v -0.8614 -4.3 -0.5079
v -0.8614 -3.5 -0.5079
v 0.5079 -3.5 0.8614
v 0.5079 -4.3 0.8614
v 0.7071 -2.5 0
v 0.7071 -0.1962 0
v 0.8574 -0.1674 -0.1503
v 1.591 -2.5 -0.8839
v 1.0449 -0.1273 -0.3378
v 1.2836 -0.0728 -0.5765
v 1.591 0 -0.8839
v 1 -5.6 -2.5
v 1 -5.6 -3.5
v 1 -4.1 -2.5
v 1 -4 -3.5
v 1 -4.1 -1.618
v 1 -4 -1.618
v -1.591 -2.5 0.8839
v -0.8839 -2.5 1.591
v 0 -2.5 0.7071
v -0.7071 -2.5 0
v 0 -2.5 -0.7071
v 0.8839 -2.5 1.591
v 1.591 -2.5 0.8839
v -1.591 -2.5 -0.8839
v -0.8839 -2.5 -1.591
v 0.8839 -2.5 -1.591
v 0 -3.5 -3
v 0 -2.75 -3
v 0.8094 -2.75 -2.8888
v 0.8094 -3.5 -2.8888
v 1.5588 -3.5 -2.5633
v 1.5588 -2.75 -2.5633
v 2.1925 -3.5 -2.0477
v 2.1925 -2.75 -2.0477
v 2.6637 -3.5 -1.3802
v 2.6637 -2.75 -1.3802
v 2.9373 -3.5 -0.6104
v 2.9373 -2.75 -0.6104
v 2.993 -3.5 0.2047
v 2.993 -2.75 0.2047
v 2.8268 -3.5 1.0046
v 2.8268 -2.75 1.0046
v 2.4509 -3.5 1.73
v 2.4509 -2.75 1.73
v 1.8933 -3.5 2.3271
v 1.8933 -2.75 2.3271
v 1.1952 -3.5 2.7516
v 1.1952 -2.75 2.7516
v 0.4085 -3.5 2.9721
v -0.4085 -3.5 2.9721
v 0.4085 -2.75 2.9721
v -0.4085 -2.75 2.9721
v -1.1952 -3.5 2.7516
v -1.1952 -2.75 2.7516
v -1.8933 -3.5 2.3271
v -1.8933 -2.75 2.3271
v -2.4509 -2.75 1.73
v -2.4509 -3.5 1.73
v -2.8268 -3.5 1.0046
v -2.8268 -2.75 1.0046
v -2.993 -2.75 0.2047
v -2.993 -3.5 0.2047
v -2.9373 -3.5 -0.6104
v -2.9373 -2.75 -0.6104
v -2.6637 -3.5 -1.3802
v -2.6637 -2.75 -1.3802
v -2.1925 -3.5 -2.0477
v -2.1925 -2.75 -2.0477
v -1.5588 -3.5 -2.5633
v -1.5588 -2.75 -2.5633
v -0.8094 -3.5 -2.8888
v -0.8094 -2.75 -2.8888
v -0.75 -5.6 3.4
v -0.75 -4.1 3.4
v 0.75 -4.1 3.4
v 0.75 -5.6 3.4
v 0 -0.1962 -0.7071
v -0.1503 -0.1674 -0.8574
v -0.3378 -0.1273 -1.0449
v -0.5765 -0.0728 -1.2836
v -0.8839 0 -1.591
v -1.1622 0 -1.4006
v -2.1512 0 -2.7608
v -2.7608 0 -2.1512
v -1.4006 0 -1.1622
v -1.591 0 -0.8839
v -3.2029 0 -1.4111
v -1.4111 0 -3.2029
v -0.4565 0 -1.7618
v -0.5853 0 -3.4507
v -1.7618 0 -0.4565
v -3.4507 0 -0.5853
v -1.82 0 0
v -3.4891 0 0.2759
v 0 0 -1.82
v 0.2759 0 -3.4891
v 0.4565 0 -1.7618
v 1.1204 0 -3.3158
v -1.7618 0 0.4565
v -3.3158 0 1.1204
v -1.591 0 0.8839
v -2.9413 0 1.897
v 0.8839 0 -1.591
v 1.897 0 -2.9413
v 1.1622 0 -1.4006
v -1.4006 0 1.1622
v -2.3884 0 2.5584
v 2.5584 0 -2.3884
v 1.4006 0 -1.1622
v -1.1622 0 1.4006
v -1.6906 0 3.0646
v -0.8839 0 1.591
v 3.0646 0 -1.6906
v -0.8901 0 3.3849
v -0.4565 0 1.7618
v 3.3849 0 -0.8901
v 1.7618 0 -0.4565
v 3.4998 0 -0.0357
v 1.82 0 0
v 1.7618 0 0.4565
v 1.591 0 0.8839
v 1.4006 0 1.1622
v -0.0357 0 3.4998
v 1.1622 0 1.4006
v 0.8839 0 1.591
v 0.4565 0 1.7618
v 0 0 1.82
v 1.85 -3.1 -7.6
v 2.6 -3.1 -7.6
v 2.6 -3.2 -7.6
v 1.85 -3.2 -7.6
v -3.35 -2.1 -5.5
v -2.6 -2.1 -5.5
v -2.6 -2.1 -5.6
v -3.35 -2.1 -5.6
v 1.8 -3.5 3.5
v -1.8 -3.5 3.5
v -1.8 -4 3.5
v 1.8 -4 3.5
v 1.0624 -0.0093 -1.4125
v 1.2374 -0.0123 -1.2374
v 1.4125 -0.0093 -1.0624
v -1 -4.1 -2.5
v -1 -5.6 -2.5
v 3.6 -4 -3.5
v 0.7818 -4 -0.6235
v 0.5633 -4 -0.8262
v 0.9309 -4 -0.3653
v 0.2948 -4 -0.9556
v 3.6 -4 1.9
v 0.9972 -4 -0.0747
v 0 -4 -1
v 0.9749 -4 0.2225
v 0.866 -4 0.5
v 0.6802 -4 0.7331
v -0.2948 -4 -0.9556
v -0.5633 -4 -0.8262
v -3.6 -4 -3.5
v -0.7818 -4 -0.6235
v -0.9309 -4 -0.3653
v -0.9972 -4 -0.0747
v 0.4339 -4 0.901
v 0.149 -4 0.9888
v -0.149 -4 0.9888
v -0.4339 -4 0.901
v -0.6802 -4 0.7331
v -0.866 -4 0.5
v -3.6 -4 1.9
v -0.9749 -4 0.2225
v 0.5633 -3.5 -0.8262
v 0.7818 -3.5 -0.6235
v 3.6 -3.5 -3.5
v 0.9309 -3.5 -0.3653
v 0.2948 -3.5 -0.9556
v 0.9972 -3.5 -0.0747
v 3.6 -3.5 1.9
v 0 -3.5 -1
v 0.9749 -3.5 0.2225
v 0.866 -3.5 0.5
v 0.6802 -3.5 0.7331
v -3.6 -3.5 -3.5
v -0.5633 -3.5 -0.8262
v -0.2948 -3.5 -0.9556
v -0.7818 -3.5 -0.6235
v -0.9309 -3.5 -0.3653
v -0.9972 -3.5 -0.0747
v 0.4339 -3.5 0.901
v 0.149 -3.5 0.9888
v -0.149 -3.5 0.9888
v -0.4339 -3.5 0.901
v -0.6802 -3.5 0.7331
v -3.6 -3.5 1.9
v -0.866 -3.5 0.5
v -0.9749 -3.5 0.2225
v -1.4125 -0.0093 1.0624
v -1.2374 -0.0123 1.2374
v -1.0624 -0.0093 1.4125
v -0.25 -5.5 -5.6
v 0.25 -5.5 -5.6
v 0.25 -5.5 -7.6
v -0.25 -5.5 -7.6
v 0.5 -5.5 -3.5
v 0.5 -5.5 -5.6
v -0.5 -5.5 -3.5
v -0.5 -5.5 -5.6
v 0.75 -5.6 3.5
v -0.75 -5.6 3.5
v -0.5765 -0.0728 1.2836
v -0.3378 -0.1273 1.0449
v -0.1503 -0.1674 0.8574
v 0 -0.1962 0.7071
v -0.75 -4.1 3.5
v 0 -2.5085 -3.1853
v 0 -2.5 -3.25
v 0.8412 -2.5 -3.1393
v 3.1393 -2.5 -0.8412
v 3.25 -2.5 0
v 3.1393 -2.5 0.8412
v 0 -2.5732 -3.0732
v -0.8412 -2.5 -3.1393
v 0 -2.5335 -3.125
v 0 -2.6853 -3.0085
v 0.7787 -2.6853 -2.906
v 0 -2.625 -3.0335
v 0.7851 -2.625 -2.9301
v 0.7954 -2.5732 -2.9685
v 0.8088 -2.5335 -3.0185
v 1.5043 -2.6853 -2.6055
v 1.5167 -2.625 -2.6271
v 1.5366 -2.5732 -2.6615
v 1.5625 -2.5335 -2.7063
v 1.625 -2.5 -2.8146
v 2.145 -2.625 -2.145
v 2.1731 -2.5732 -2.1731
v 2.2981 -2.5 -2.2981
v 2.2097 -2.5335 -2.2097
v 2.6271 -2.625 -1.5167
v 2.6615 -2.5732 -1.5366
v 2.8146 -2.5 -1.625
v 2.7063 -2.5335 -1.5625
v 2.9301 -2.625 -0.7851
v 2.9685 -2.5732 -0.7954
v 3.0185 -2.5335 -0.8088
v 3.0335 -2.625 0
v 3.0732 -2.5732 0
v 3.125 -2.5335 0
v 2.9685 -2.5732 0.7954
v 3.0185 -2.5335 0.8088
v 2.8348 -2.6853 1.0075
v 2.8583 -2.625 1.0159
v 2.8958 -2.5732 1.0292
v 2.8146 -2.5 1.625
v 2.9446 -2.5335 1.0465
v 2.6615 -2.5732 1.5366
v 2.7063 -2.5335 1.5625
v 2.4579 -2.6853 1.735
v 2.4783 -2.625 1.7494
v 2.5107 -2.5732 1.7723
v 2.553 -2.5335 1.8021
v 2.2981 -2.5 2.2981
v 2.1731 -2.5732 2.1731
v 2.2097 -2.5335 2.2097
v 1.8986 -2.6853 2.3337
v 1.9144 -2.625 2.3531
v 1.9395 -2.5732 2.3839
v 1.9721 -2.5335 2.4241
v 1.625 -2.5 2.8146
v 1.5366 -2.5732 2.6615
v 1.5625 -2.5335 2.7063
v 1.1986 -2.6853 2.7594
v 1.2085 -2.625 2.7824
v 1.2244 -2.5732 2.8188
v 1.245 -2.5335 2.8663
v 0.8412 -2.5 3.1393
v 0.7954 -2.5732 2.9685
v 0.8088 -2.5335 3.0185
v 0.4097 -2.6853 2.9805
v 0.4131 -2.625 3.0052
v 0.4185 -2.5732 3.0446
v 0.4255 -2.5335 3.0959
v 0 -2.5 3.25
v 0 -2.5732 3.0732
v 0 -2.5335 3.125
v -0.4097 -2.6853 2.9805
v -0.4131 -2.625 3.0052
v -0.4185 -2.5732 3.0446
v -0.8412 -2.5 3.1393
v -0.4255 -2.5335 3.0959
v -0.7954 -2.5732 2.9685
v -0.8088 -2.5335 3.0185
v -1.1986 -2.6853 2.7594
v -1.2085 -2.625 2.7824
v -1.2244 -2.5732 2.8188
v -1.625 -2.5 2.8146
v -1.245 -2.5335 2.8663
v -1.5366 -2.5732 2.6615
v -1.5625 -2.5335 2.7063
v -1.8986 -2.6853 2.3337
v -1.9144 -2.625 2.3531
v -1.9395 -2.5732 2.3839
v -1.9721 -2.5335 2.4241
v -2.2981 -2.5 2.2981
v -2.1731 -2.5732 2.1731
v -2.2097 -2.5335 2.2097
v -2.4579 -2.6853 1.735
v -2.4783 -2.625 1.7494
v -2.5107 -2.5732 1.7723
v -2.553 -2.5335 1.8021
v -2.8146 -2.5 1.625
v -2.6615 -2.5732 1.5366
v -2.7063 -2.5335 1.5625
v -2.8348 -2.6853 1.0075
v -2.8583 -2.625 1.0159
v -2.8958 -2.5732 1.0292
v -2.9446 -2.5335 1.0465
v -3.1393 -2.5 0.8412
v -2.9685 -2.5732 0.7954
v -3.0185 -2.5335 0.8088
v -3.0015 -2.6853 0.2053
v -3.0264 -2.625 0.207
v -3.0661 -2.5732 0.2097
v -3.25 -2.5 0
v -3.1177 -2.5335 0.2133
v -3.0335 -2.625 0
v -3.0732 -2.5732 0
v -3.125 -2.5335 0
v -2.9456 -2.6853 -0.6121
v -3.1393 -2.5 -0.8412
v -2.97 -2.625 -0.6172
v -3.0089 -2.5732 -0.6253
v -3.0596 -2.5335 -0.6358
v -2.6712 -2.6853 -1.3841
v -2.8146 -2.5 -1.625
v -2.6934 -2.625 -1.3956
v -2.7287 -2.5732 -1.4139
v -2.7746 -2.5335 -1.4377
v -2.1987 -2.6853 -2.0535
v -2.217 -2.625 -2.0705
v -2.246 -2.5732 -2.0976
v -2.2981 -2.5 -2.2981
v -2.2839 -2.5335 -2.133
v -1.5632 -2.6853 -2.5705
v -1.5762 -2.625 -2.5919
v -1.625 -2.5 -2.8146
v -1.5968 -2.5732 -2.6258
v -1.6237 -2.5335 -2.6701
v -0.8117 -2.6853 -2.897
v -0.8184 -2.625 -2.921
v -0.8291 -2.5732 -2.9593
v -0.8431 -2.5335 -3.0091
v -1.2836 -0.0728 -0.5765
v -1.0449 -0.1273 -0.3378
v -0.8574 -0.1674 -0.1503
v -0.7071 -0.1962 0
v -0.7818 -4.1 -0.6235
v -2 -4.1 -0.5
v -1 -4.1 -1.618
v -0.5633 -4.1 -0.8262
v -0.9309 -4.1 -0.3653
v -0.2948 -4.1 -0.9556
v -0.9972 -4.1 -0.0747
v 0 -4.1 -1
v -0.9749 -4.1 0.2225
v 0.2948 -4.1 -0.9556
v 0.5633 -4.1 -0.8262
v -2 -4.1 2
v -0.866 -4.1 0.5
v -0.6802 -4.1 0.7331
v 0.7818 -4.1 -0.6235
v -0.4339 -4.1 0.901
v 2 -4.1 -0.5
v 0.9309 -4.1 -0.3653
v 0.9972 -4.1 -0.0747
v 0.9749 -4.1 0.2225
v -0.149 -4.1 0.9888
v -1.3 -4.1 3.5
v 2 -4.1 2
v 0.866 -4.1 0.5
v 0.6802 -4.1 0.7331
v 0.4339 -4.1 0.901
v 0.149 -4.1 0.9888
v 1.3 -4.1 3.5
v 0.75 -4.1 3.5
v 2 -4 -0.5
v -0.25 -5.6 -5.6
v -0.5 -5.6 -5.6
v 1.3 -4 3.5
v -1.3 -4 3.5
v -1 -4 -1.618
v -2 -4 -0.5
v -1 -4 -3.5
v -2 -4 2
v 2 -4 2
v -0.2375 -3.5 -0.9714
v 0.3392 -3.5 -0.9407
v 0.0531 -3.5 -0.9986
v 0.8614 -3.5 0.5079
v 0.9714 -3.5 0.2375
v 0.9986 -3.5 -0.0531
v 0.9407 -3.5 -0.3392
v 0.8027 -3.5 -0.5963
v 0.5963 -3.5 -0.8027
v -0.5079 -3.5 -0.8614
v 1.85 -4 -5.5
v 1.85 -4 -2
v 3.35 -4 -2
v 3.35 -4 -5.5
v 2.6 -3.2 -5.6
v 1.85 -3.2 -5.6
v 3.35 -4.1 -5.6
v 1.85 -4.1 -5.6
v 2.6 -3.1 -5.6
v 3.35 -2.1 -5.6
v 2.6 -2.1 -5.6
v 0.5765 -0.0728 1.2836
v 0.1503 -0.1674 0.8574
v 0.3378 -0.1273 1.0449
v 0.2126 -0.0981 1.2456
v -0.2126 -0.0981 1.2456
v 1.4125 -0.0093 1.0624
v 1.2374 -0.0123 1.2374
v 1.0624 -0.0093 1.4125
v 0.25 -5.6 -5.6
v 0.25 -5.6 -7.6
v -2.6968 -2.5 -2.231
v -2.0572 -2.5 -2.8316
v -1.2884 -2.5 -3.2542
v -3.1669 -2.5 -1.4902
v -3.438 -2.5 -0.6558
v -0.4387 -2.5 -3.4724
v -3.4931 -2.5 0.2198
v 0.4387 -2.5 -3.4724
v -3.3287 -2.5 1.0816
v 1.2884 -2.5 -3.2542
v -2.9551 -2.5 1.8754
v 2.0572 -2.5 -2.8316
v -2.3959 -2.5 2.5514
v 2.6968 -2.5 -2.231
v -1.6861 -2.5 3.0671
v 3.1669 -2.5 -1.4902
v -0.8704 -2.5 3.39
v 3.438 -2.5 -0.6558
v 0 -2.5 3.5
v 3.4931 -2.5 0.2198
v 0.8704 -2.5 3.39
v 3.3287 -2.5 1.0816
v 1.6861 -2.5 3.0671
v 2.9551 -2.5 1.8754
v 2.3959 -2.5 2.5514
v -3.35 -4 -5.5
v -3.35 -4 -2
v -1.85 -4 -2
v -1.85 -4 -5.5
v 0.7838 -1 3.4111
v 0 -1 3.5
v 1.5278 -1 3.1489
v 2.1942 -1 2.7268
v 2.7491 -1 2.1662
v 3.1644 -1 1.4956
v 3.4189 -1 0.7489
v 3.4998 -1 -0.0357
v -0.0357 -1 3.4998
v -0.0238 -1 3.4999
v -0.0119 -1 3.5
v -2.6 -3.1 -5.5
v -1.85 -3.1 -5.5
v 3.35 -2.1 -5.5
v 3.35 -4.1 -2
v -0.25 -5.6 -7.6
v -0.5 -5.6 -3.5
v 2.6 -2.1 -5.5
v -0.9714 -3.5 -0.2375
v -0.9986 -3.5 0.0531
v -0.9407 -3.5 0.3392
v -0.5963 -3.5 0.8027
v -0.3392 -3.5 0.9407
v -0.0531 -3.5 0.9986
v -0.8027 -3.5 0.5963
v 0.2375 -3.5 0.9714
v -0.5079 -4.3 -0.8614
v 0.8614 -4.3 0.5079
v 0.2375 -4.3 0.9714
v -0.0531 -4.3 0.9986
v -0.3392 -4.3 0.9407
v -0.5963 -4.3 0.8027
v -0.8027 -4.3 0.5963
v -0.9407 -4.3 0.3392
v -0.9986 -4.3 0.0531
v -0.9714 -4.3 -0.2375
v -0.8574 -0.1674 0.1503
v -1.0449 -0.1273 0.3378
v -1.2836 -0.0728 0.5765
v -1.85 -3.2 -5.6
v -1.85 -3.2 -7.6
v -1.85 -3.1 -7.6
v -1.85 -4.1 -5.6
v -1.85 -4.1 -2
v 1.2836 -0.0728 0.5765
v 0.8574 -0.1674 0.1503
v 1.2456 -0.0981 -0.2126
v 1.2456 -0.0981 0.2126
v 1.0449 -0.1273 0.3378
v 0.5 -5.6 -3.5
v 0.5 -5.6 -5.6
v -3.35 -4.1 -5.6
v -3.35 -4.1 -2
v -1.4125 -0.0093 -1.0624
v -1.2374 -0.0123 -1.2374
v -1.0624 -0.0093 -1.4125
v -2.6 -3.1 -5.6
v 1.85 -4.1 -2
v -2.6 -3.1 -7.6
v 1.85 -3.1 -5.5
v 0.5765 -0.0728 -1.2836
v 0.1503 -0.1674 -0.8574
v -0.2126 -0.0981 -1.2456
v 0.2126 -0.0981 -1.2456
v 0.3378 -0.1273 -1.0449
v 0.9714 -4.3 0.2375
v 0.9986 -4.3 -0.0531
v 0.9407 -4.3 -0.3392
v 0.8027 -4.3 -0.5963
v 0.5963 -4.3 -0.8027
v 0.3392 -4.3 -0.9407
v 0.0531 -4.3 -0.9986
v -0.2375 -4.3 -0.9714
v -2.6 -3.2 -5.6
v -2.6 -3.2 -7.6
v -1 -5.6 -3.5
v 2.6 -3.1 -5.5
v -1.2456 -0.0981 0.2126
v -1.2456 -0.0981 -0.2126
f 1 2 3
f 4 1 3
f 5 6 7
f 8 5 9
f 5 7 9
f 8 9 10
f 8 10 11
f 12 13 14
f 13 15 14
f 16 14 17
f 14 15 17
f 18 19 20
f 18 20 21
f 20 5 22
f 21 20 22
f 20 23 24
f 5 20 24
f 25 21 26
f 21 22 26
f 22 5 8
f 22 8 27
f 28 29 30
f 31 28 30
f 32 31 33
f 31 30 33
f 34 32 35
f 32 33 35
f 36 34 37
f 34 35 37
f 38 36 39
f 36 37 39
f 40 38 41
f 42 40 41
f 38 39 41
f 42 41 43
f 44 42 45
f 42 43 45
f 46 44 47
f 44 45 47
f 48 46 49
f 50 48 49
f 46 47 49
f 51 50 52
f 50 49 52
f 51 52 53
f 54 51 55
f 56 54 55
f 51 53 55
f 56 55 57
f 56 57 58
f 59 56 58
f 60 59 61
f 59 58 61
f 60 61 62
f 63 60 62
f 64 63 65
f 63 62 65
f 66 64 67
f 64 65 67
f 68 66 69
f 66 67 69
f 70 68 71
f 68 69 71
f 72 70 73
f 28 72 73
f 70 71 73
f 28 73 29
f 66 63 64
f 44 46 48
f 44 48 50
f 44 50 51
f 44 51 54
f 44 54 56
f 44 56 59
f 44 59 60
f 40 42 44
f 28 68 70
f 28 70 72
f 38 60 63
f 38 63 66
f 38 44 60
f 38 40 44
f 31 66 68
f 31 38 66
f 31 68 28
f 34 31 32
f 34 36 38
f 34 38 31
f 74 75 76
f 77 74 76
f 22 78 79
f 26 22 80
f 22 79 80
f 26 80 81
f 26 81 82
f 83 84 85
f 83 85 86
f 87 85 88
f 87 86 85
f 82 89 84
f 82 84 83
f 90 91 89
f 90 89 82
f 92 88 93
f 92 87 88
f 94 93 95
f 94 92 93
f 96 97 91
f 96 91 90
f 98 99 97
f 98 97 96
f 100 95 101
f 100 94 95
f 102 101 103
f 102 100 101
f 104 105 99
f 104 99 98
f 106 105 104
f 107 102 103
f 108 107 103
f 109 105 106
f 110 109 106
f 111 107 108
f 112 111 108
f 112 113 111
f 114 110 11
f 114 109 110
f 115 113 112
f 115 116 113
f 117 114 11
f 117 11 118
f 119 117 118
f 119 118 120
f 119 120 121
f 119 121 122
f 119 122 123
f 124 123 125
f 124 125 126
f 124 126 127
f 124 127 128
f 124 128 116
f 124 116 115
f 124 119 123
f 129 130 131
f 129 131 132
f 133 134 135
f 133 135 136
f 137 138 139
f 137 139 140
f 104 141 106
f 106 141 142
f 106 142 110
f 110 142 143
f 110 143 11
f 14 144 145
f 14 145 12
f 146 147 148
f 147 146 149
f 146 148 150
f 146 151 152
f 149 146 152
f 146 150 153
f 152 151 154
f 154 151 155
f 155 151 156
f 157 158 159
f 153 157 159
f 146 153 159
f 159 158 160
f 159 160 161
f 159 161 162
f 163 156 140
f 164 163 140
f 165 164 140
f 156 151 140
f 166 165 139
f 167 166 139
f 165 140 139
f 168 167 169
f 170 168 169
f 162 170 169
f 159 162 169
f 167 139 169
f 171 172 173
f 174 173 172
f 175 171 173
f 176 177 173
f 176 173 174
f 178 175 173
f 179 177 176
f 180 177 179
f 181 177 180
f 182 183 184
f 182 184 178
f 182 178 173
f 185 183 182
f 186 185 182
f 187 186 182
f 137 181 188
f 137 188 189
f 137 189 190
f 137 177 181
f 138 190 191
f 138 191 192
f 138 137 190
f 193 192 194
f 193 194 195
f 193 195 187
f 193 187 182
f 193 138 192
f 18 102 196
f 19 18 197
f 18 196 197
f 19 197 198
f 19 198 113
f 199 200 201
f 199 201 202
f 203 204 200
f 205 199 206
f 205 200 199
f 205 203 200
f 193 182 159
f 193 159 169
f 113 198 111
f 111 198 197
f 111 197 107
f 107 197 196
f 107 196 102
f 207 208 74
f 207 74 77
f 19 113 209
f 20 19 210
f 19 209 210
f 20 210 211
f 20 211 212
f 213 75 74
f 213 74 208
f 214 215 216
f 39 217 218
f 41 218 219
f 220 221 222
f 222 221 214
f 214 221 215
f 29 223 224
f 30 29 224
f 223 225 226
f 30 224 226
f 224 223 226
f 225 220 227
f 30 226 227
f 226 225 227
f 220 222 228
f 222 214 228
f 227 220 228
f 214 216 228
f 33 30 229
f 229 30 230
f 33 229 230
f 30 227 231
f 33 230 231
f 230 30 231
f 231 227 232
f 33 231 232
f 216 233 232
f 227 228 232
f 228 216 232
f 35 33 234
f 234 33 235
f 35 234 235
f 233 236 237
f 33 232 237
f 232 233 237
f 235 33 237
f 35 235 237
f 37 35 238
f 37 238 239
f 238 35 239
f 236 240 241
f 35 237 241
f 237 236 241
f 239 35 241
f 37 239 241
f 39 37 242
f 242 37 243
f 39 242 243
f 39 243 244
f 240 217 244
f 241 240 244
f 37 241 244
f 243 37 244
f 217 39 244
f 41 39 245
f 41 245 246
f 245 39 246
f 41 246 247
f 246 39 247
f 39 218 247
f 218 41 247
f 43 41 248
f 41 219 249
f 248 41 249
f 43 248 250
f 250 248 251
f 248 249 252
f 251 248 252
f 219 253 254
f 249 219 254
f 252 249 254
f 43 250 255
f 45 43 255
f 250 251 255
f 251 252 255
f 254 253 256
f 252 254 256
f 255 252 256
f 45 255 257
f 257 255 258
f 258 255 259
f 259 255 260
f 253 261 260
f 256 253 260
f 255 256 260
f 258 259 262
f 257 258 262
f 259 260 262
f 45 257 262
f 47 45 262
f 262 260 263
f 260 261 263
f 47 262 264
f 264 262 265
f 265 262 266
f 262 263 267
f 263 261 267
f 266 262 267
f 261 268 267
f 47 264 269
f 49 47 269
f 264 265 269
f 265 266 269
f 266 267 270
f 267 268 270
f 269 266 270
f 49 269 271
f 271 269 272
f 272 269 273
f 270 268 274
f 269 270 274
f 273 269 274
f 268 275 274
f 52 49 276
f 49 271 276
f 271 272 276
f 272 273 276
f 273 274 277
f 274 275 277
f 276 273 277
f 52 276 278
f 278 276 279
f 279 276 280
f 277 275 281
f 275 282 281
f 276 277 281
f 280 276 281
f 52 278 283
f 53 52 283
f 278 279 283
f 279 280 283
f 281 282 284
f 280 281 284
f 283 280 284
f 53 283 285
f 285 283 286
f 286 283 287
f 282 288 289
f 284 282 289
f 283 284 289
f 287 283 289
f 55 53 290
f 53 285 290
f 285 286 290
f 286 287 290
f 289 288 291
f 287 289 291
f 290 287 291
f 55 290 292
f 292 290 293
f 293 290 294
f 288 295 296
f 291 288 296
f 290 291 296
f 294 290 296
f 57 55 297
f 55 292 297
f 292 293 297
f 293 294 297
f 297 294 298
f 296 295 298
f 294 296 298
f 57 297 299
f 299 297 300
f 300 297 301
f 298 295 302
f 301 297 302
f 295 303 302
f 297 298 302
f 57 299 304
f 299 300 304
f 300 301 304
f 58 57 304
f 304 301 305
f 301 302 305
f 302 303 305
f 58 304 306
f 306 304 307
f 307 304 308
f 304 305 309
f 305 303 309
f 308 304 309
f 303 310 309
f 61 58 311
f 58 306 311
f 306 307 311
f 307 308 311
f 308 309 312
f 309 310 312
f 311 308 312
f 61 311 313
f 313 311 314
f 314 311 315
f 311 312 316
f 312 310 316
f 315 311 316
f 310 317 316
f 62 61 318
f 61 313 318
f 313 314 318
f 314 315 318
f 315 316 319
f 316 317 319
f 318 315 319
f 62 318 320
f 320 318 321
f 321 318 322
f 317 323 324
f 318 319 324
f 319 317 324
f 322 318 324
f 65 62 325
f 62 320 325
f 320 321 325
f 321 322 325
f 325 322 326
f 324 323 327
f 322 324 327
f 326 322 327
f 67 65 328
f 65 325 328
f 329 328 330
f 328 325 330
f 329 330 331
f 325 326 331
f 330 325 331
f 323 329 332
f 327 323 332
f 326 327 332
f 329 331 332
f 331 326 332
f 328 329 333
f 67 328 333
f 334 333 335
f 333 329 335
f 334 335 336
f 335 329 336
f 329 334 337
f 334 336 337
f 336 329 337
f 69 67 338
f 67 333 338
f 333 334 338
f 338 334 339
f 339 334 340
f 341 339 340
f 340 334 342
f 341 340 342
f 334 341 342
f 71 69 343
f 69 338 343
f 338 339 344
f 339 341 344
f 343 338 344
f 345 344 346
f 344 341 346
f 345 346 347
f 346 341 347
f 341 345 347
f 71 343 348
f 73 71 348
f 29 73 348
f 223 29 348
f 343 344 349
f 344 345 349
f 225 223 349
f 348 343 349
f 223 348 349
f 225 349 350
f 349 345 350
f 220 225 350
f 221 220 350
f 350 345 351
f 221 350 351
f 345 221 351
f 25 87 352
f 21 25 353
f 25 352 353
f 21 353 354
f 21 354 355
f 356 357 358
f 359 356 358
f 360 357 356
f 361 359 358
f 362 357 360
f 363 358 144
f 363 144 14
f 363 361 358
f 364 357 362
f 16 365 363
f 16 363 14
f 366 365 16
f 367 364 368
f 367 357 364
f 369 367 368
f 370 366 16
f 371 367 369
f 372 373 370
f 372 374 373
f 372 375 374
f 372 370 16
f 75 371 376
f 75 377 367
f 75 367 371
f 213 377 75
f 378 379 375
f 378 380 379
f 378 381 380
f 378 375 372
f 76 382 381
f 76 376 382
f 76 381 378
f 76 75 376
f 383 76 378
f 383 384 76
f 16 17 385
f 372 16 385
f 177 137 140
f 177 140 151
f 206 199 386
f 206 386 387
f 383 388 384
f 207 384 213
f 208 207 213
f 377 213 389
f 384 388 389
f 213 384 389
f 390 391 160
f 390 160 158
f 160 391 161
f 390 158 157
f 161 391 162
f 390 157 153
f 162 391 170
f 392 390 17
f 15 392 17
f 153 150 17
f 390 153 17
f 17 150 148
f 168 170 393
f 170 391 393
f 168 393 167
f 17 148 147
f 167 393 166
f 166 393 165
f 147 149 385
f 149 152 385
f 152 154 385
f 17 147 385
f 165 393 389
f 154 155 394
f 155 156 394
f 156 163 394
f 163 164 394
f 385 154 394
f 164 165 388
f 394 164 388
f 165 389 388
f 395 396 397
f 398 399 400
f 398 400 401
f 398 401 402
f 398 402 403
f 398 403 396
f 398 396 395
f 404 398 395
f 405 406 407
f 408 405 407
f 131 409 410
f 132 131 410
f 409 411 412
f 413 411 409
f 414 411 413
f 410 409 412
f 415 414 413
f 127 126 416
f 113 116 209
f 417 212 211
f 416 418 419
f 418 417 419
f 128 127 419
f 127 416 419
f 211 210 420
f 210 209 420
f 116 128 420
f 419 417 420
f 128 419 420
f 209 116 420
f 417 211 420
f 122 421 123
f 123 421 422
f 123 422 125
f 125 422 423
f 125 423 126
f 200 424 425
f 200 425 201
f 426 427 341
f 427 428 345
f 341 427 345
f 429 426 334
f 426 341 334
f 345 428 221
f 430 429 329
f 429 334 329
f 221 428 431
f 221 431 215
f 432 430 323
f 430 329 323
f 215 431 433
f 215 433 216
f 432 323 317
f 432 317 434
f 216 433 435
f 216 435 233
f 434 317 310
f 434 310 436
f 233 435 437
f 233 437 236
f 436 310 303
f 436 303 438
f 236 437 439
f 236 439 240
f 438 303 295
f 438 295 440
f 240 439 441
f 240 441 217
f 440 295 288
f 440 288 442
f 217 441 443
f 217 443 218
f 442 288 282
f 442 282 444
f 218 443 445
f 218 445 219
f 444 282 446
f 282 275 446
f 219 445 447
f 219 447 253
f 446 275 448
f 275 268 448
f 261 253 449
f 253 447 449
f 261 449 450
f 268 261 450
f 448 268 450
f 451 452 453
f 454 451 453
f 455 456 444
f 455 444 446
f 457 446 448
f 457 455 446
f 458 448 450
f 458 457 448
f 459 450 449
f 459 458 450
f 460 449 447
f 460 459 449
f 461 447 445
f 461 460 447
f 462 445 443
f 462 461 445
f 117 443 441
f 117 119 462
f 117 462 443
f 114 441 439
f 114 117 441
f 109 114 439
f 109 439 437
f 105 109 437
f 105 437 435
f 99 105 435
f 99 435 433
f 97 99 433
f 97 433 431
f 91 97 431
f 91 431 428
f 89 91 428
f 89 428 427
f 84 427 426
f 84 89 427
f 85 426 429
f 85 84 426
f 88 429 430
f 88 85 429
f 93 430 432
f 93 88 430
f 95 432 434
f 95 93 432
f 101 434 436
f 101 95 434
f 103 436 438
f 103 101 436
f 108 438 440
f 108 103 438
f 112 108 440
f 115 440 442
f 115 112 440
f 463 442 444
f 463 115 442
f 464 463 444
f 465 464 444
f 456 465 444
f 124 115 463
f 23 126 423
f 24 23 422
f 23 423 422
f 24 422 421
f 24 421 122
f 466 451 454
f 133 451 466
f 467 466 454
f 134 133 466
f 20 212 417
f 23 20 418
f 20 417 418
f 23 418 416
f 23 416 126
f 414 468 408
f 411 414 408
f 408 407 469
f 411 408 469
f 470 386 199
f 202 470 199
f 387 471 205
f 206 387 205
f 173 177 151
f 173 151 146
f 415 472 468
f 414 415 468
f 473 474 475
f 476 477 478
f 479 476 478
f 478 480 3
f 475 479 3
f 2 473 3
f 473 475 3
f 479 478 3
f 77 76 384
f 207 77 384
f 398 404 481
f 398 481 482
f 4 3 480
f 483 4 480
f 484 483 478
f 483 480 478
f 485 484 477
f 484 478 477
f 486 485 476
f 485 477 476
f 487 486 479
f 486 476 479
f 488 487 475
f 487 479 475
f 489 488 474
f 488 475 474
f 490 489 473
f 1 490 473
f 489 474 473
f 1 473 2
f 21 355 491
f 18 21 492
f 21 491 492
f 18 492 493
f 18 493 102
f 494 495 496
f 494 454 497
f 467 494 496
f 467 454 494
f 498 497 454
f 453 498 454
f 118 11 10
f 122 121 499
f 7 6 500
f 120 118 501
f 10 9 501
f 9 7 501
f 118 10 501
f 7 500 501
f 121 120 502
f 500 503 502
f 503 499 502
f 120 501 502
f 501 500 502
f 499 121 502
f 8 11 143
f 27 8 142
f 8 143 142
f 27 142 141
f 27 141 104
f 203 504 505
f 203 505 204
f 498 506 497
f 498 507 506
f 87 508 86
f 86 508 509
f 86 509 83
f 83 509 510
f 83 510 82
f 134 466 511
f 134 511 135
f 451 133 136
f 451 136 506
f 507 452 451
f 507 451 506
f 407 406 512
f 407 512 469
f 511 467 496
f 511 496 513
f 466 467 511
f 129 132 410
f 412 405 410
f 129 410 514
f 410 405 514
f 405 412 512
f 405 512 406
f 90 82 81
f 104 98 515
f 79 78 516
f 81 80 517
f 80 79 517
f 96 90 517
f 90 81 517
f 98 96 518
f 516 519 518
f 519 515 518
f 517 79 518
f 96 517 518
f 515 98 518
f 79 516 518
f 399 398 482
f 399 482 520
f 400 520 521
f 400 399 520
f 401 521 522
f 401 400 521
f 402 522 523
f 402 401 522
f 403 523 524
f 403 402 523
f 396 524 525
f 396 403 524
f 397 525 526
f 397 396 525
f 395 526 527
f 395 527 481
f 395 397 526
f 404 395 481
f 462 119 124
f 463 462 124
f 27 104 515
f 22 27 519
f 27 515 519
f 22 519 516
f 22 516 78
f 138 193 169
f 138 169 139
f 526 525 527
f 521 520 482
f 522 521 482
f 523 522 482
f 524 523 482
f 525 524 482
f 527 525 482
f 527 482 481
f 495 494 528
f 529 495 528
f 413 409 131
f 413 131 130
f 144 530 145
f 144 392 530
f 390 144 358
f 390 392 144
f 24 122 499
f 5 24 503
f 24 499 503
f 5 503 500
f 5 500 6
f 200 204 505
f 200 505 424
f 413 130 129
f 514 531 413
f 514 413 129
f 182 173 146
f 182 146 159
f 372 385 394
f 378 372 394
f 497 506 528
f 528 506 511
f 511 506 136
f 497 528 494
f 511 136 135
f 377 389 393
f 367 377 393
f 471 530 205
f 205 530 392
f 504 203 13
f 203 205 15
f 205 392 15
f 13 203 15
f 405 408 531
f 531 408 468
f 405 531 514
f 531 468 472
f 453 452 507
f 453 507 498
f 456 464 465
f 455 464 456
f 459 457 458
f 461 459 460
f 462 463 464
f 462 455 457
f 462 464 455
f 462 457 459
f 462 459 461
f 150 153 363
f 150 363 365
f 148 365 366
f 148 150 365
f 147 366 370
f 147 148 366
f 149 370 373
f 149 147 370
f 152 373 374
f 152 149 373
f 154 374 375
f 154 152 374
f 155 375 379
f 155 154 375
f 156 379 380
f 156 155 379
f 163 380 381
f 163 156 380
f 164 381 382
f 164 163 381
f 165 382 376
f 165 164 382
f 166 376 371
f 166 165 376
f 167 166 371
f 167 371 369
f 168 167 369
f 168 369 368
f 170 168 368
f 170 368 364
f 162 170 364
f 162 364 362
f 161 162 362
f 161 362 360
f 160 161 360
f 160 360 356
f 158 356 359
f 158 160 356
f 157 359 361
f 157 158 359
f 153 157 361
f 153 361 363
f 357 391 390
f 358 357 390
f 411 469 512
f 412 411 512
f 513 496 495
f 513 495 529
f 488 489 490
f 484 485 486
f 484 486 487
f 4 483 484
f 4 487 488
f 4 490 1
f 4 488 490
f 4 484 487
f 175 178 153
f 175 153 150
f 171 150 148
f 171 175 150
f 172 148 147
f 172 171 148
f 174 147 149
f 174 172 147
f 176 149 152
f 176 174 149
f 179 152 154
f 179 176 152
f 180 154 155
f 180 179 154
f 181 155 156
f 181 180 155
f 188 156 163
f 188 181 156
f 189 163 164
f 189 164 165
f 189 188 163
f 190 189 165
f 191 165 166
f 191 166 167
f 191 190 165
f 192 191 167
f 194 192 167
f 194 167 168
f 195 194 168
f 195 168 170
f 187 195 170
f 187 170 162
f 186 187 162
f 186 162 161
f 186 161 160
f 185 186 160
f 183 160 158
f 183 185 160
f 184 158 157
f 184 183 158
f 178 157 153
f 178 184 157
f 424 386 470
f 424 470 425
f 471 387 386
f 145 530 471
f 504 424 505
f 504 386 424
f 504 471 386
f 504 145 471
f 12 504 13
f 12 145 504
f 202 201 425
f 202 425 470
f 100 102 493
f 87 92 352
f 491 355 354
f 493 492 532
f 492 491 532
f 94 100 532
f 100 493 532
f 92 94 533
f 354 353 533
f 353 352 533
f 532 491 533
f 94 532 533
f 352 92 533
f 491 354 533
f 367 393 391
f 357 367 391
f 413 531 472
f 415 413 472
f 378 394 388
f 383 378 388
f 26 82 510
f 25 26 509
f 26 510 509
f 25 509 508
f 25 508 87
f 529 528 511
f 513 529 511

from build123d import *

# Parameters (mm, degrees)
SKETCH1_R              = 3.5
BOSS_EXTRUDE1_DEPTH    = 2.5
CUT_EXTRUDE1_DEPTH     = 1
SKETCH4_R              = 3
BOSS_EXTRUDE2_DEPTH    = 1
FILLET1_R              = 0.25
SKETCH5_R              = 1
BOSS_EXTRUDE3_DEPTH    = 0.5
SKETCH6_R              = 1
BOSS_EXTRUDE4_DEPTH    = 0.1
SKETCH6_W              = 1.5
SKETCH6_H              = 3.5
BOSS_EXTRUDE4_2_DEPTH  = 0.1
BOSS_EXTRUDE4_3_DEPTH  = 0.1
SKETCH7_W              = 1.5
SKETCH7_H              = 0.1
SKETCH7_W_2            = 2
SKETCH7_H_2            = 1
BOSS_EXTRUDE5_DEPTH    = 1.5
BOSS_EXTRUDE6_DEPTH    = 0.1
SKETCH9_W              = 0.75
SKETCH9_H              = 0.1
BOSS_EXTRUDE7_DEPTH    = 2
SKETCH11_W             = 1
SKETCH11_H             = 0.1
BOSS_EXTRUDE8_DEPTH    = 2.1
SKETCH12_W             = 0.5
SKETCH12_H             = 0.1
BOSS_EXTRUDE9_DEPTH    = 2
BOSS_EXTRUDE10_DEPTH   = 0.8
BOSS_EXTRUDE10_2_DEPTH = 0.8


with BuildPart() as part:
    # Sketch1 → Boss-Extrude1 (new body)
    with BuildSketch(Plane(origin=(0, 0, 0), x_dir=(1, 0, 0), z_dir=(0, 1, 0))):
        with Locations(Location((0, 0, 0), (0, 0, 270))):
            Circle(SKETCH1_R)
        Polygon((0.883883476, 1.590990258), (0, 0.707106781), (-0.883883476, 1.590990258), (-1.590990258, 0.883883476), (-0.707106781, 0), (-1.590990258, -0.883883476), (-0.883883476, -1.590990258), (0, -0.707106781), (0.883883476, -1.590990258), (1.590990258, -0.883883476), (0.707106781, 0), (1.590990258, 0.883883476), align=None, mode=Mode.SUBTRACT)
    extrude(amount=-BOSS_EXTRUDE1_DEPTH)

    # Sketch2 → Cut-Extrude1 (cut)
    with BuildSketch(Plane(origin=(0, 0, 0), x_dir=(1, 0, 0), z_dir=(0, 1, 0))):
        with BuildLine():
            Line((3.499817761, 0.035716145), (-0.035716145, -3.499817761))
            ThreePointArc((-0.035716145, -3.499817761), (2.474873734, -2.474873734), (3.499817761, 0.035716145))
        make_face()
    extrude(amount=-CUT_EXTRUDE1_DEPTH, mode=Mode.SUBTRACT)

    # Cut-Extrude2 cone 1 section (through the dimple's axis) → Cut-Extrude2 (revolve, cut)
    with BuildSketch(Plane(origin=(0, 0, 0), x_dir=(0, 0, 1), z_dir=(1, 0, 0))):
        Polygon((0, 0), (1.820027472, 0), (0, 0.320919949), align=None)
    revolve(axis=Axis((0, 0, 0), (0, -1, 0)), mode=Mode.SUBTRACT)

    # Sketch4 → Boss-Extrude2 (add)
    with BuildSketch(Plane.XZ.offset(2.5)):
        with Locations(Location((0, 0, 0), (0, 0, 270))):
            Circle(SKETCH4_R)
    extrude(amount=BOSS_EXTRUDE2_DEPTH)

    # Fillet1
    fillet1_edges = [part.edges().sort_by_distance(p)[0] for p in [
        (0, -2.5, 3),
    ]]
    fillet(fillet1_edges, radius=FILLET1_R)


with BuildPart() as body_2:
    # Sketch5 → Boss-Extrude3 (new body)
    with BuildSketch(Plane.XZ.offset(3.5)):
        Polygon((1.8, 3.5), (3.6, 1.9), (3.6, -3.5), (-3.6, -3.5), (-3.6, 1.9), (-1.8, 3.5), align=None)
        with Locations(Location((0, 0, 0), (0, 0, 270))):
            Circle(SKETCH5_R, mode=Mode.SUBTRACT)
    extrude(amount=BOSS_EXTRUDE3_DEPTH)


with BuildPart() as body_3:
    # Sketch6 → Boss-Extrude4 (new body)
    with BuildSketch(Plane.XZ.offset(4)):
        Polygon((-1.3, 3.5), (-2, 2), (-2, -0.5), (-1, -1.618033989), (-1, -3.5), (1, -3.5), (1, -1.618033989), (2, -0.5), (2, 2), (1.3, 3.5), align=None)
        with Locations(Location((0, 0, 0), (0, 0, 270))):
            Circle(SKETCH6_R, mode=Mode.SUBTRACT)
    extrude(amount=BOSS_EXTRUDE4_DEPTH)

    # Sketch7 → Boss-Extrude5 (add)
    with BuildSketch(Plane.XZ.offset(4.1)):
        with Locations((0, 3.45)):
            Rectangle(SKETCH7_W, SKETCH7_H)
        with Locations((0, -3)):
            Rectangle(SKETCH7_W_2, SKETCH7_H_2)
    extrude(amount=BOSS_EXTRUDE5_DEPTH)

    # Sketch11 → Boss-Extrude8 (add)
    with BuildSketch(Plane(origin=(0, 0, -3.5), x_dir=(-1, 0, 0), z_dir=(0, 0, -1))):
        with Locations((0, -5.55)):
            Rectangle(SKETCH11_W, SKETCH11_H)
    extrude(amount=BOSS_EXTRUDE8_DEPTH)

    # Sketch12 → Boss-Extrude9 (add)
    with BuildSketch(Plane(origin=(0, 0, -5.6), x_dir=(-1, 0, 0), z_dir=(0, 0, -1))):
        with Locations((0, -5.55)):
            Rectangle(SKETCH12_W, SKETCH12_H)
    extrude(amount=BOSS_EXTRUDE9_DEPTH)


with BuildPart() as body_4:
    # Sketch6 → Boss-Extrude4 2 (new body)
    with BuildSketch(Plane.XZ.offset(4)):
        with Locations((-2.6, -3.75)):
            Rectangle(SKETCH6_W, SKETCH6_H)
    extrude(amount=BOSS_EXTRUDE4_2_DEPTH)



with BuildPart() as body_5:
    # Sketch6 → Boss-Extrude4 3 (new body)
    with BuildSketch(Plane.XZ.offset(4)):
        with Locations((2.6, -3.75)):
            Rectangle(SKETCH6_W, SKETCH6_H)
    extrude(amount=BOSS_EXTRUDE4_3_DEPTH)


with BuildPart() as body_4_1:
    add(body_4.part)

    add(body_5.part)  # Boss-Extrude6 merges body 5
    # Sketch8 → Boss-Extrude6 (add)
    with BuildSketch(Plane(origin=(0, 0, -5.5), x_dir=(-1, 0, 0), z_dir=(0, 0, -1))):
        Polygon((-3.35, -4.1), (-1.85, -4.1), (-1.85, -3.1), (-2.6, -3.1), (-2.6, -2.1), (-3.35, -2.1), align=None)
        Polygon((3.35, -4.1), (1.85, -4.1), (1.85, -3.1), (2.6, -3.1), (2.6, -2.1), (3.35, -2.1), align=None)
    extrude(amount=BOSS_EXTRUDE6_DEPTH)

    # Sketch9 → Boss-Extrude7 (add)
    with BuildSketch(Plane(origin=(0, 0, -5.6), x_dir=(-1, 0, 0), z_dir=(0, 0, -1))):
        with Locations((-2.225, -3.15)):
            Rectangle(SKETCH9_W, SKETCH9_H)
        with Locations((2.225, -3.15)):
            Rectangle(SKETCH9_W, SKETCH9_H)
    extrude(amount=BOSS_EXTRUDE7_DEPTH)


with BuildPart() as body_5_2:
    # Sketch13 → Boss-Extrude10 (new body)
    with BuildSketch(Plane.XZ.offset(3.5)):
        with BuildLine():
            Line((-0.507876502, -0.861429892), (0.861429892, 0.507876502))
            ThreePointArc((0.861429892, 0.507876502), (0.707106781, -0.707106781), (-0.507876502, -0.861429892))
        make_face()
    extrude(amount=BOSS_EXTRUDE10_DEPTH)


with BuildPart() as body_6:
    # Sketch13 → Boss-Extrude10 2 (new body)
    with BuildSketch(Plane.XZ.offset(3.5)):
        with BuildLine():
            Line((-0.861429892, -0.507876502), (0.507876502, 0.861429892))
            ThreePointArc((0.507876502, 0.861429892), (-0.707106781, 0.707106781), (-0.861429892, -0.507876502))
        make_face()
    extrude(amount=BOSS_EXTRUDE10_2_DEPTH)


solid = Compound([part.part, body_2.part, body_3.part, body_4_1.part, body_5_2.part, body_6.part])
